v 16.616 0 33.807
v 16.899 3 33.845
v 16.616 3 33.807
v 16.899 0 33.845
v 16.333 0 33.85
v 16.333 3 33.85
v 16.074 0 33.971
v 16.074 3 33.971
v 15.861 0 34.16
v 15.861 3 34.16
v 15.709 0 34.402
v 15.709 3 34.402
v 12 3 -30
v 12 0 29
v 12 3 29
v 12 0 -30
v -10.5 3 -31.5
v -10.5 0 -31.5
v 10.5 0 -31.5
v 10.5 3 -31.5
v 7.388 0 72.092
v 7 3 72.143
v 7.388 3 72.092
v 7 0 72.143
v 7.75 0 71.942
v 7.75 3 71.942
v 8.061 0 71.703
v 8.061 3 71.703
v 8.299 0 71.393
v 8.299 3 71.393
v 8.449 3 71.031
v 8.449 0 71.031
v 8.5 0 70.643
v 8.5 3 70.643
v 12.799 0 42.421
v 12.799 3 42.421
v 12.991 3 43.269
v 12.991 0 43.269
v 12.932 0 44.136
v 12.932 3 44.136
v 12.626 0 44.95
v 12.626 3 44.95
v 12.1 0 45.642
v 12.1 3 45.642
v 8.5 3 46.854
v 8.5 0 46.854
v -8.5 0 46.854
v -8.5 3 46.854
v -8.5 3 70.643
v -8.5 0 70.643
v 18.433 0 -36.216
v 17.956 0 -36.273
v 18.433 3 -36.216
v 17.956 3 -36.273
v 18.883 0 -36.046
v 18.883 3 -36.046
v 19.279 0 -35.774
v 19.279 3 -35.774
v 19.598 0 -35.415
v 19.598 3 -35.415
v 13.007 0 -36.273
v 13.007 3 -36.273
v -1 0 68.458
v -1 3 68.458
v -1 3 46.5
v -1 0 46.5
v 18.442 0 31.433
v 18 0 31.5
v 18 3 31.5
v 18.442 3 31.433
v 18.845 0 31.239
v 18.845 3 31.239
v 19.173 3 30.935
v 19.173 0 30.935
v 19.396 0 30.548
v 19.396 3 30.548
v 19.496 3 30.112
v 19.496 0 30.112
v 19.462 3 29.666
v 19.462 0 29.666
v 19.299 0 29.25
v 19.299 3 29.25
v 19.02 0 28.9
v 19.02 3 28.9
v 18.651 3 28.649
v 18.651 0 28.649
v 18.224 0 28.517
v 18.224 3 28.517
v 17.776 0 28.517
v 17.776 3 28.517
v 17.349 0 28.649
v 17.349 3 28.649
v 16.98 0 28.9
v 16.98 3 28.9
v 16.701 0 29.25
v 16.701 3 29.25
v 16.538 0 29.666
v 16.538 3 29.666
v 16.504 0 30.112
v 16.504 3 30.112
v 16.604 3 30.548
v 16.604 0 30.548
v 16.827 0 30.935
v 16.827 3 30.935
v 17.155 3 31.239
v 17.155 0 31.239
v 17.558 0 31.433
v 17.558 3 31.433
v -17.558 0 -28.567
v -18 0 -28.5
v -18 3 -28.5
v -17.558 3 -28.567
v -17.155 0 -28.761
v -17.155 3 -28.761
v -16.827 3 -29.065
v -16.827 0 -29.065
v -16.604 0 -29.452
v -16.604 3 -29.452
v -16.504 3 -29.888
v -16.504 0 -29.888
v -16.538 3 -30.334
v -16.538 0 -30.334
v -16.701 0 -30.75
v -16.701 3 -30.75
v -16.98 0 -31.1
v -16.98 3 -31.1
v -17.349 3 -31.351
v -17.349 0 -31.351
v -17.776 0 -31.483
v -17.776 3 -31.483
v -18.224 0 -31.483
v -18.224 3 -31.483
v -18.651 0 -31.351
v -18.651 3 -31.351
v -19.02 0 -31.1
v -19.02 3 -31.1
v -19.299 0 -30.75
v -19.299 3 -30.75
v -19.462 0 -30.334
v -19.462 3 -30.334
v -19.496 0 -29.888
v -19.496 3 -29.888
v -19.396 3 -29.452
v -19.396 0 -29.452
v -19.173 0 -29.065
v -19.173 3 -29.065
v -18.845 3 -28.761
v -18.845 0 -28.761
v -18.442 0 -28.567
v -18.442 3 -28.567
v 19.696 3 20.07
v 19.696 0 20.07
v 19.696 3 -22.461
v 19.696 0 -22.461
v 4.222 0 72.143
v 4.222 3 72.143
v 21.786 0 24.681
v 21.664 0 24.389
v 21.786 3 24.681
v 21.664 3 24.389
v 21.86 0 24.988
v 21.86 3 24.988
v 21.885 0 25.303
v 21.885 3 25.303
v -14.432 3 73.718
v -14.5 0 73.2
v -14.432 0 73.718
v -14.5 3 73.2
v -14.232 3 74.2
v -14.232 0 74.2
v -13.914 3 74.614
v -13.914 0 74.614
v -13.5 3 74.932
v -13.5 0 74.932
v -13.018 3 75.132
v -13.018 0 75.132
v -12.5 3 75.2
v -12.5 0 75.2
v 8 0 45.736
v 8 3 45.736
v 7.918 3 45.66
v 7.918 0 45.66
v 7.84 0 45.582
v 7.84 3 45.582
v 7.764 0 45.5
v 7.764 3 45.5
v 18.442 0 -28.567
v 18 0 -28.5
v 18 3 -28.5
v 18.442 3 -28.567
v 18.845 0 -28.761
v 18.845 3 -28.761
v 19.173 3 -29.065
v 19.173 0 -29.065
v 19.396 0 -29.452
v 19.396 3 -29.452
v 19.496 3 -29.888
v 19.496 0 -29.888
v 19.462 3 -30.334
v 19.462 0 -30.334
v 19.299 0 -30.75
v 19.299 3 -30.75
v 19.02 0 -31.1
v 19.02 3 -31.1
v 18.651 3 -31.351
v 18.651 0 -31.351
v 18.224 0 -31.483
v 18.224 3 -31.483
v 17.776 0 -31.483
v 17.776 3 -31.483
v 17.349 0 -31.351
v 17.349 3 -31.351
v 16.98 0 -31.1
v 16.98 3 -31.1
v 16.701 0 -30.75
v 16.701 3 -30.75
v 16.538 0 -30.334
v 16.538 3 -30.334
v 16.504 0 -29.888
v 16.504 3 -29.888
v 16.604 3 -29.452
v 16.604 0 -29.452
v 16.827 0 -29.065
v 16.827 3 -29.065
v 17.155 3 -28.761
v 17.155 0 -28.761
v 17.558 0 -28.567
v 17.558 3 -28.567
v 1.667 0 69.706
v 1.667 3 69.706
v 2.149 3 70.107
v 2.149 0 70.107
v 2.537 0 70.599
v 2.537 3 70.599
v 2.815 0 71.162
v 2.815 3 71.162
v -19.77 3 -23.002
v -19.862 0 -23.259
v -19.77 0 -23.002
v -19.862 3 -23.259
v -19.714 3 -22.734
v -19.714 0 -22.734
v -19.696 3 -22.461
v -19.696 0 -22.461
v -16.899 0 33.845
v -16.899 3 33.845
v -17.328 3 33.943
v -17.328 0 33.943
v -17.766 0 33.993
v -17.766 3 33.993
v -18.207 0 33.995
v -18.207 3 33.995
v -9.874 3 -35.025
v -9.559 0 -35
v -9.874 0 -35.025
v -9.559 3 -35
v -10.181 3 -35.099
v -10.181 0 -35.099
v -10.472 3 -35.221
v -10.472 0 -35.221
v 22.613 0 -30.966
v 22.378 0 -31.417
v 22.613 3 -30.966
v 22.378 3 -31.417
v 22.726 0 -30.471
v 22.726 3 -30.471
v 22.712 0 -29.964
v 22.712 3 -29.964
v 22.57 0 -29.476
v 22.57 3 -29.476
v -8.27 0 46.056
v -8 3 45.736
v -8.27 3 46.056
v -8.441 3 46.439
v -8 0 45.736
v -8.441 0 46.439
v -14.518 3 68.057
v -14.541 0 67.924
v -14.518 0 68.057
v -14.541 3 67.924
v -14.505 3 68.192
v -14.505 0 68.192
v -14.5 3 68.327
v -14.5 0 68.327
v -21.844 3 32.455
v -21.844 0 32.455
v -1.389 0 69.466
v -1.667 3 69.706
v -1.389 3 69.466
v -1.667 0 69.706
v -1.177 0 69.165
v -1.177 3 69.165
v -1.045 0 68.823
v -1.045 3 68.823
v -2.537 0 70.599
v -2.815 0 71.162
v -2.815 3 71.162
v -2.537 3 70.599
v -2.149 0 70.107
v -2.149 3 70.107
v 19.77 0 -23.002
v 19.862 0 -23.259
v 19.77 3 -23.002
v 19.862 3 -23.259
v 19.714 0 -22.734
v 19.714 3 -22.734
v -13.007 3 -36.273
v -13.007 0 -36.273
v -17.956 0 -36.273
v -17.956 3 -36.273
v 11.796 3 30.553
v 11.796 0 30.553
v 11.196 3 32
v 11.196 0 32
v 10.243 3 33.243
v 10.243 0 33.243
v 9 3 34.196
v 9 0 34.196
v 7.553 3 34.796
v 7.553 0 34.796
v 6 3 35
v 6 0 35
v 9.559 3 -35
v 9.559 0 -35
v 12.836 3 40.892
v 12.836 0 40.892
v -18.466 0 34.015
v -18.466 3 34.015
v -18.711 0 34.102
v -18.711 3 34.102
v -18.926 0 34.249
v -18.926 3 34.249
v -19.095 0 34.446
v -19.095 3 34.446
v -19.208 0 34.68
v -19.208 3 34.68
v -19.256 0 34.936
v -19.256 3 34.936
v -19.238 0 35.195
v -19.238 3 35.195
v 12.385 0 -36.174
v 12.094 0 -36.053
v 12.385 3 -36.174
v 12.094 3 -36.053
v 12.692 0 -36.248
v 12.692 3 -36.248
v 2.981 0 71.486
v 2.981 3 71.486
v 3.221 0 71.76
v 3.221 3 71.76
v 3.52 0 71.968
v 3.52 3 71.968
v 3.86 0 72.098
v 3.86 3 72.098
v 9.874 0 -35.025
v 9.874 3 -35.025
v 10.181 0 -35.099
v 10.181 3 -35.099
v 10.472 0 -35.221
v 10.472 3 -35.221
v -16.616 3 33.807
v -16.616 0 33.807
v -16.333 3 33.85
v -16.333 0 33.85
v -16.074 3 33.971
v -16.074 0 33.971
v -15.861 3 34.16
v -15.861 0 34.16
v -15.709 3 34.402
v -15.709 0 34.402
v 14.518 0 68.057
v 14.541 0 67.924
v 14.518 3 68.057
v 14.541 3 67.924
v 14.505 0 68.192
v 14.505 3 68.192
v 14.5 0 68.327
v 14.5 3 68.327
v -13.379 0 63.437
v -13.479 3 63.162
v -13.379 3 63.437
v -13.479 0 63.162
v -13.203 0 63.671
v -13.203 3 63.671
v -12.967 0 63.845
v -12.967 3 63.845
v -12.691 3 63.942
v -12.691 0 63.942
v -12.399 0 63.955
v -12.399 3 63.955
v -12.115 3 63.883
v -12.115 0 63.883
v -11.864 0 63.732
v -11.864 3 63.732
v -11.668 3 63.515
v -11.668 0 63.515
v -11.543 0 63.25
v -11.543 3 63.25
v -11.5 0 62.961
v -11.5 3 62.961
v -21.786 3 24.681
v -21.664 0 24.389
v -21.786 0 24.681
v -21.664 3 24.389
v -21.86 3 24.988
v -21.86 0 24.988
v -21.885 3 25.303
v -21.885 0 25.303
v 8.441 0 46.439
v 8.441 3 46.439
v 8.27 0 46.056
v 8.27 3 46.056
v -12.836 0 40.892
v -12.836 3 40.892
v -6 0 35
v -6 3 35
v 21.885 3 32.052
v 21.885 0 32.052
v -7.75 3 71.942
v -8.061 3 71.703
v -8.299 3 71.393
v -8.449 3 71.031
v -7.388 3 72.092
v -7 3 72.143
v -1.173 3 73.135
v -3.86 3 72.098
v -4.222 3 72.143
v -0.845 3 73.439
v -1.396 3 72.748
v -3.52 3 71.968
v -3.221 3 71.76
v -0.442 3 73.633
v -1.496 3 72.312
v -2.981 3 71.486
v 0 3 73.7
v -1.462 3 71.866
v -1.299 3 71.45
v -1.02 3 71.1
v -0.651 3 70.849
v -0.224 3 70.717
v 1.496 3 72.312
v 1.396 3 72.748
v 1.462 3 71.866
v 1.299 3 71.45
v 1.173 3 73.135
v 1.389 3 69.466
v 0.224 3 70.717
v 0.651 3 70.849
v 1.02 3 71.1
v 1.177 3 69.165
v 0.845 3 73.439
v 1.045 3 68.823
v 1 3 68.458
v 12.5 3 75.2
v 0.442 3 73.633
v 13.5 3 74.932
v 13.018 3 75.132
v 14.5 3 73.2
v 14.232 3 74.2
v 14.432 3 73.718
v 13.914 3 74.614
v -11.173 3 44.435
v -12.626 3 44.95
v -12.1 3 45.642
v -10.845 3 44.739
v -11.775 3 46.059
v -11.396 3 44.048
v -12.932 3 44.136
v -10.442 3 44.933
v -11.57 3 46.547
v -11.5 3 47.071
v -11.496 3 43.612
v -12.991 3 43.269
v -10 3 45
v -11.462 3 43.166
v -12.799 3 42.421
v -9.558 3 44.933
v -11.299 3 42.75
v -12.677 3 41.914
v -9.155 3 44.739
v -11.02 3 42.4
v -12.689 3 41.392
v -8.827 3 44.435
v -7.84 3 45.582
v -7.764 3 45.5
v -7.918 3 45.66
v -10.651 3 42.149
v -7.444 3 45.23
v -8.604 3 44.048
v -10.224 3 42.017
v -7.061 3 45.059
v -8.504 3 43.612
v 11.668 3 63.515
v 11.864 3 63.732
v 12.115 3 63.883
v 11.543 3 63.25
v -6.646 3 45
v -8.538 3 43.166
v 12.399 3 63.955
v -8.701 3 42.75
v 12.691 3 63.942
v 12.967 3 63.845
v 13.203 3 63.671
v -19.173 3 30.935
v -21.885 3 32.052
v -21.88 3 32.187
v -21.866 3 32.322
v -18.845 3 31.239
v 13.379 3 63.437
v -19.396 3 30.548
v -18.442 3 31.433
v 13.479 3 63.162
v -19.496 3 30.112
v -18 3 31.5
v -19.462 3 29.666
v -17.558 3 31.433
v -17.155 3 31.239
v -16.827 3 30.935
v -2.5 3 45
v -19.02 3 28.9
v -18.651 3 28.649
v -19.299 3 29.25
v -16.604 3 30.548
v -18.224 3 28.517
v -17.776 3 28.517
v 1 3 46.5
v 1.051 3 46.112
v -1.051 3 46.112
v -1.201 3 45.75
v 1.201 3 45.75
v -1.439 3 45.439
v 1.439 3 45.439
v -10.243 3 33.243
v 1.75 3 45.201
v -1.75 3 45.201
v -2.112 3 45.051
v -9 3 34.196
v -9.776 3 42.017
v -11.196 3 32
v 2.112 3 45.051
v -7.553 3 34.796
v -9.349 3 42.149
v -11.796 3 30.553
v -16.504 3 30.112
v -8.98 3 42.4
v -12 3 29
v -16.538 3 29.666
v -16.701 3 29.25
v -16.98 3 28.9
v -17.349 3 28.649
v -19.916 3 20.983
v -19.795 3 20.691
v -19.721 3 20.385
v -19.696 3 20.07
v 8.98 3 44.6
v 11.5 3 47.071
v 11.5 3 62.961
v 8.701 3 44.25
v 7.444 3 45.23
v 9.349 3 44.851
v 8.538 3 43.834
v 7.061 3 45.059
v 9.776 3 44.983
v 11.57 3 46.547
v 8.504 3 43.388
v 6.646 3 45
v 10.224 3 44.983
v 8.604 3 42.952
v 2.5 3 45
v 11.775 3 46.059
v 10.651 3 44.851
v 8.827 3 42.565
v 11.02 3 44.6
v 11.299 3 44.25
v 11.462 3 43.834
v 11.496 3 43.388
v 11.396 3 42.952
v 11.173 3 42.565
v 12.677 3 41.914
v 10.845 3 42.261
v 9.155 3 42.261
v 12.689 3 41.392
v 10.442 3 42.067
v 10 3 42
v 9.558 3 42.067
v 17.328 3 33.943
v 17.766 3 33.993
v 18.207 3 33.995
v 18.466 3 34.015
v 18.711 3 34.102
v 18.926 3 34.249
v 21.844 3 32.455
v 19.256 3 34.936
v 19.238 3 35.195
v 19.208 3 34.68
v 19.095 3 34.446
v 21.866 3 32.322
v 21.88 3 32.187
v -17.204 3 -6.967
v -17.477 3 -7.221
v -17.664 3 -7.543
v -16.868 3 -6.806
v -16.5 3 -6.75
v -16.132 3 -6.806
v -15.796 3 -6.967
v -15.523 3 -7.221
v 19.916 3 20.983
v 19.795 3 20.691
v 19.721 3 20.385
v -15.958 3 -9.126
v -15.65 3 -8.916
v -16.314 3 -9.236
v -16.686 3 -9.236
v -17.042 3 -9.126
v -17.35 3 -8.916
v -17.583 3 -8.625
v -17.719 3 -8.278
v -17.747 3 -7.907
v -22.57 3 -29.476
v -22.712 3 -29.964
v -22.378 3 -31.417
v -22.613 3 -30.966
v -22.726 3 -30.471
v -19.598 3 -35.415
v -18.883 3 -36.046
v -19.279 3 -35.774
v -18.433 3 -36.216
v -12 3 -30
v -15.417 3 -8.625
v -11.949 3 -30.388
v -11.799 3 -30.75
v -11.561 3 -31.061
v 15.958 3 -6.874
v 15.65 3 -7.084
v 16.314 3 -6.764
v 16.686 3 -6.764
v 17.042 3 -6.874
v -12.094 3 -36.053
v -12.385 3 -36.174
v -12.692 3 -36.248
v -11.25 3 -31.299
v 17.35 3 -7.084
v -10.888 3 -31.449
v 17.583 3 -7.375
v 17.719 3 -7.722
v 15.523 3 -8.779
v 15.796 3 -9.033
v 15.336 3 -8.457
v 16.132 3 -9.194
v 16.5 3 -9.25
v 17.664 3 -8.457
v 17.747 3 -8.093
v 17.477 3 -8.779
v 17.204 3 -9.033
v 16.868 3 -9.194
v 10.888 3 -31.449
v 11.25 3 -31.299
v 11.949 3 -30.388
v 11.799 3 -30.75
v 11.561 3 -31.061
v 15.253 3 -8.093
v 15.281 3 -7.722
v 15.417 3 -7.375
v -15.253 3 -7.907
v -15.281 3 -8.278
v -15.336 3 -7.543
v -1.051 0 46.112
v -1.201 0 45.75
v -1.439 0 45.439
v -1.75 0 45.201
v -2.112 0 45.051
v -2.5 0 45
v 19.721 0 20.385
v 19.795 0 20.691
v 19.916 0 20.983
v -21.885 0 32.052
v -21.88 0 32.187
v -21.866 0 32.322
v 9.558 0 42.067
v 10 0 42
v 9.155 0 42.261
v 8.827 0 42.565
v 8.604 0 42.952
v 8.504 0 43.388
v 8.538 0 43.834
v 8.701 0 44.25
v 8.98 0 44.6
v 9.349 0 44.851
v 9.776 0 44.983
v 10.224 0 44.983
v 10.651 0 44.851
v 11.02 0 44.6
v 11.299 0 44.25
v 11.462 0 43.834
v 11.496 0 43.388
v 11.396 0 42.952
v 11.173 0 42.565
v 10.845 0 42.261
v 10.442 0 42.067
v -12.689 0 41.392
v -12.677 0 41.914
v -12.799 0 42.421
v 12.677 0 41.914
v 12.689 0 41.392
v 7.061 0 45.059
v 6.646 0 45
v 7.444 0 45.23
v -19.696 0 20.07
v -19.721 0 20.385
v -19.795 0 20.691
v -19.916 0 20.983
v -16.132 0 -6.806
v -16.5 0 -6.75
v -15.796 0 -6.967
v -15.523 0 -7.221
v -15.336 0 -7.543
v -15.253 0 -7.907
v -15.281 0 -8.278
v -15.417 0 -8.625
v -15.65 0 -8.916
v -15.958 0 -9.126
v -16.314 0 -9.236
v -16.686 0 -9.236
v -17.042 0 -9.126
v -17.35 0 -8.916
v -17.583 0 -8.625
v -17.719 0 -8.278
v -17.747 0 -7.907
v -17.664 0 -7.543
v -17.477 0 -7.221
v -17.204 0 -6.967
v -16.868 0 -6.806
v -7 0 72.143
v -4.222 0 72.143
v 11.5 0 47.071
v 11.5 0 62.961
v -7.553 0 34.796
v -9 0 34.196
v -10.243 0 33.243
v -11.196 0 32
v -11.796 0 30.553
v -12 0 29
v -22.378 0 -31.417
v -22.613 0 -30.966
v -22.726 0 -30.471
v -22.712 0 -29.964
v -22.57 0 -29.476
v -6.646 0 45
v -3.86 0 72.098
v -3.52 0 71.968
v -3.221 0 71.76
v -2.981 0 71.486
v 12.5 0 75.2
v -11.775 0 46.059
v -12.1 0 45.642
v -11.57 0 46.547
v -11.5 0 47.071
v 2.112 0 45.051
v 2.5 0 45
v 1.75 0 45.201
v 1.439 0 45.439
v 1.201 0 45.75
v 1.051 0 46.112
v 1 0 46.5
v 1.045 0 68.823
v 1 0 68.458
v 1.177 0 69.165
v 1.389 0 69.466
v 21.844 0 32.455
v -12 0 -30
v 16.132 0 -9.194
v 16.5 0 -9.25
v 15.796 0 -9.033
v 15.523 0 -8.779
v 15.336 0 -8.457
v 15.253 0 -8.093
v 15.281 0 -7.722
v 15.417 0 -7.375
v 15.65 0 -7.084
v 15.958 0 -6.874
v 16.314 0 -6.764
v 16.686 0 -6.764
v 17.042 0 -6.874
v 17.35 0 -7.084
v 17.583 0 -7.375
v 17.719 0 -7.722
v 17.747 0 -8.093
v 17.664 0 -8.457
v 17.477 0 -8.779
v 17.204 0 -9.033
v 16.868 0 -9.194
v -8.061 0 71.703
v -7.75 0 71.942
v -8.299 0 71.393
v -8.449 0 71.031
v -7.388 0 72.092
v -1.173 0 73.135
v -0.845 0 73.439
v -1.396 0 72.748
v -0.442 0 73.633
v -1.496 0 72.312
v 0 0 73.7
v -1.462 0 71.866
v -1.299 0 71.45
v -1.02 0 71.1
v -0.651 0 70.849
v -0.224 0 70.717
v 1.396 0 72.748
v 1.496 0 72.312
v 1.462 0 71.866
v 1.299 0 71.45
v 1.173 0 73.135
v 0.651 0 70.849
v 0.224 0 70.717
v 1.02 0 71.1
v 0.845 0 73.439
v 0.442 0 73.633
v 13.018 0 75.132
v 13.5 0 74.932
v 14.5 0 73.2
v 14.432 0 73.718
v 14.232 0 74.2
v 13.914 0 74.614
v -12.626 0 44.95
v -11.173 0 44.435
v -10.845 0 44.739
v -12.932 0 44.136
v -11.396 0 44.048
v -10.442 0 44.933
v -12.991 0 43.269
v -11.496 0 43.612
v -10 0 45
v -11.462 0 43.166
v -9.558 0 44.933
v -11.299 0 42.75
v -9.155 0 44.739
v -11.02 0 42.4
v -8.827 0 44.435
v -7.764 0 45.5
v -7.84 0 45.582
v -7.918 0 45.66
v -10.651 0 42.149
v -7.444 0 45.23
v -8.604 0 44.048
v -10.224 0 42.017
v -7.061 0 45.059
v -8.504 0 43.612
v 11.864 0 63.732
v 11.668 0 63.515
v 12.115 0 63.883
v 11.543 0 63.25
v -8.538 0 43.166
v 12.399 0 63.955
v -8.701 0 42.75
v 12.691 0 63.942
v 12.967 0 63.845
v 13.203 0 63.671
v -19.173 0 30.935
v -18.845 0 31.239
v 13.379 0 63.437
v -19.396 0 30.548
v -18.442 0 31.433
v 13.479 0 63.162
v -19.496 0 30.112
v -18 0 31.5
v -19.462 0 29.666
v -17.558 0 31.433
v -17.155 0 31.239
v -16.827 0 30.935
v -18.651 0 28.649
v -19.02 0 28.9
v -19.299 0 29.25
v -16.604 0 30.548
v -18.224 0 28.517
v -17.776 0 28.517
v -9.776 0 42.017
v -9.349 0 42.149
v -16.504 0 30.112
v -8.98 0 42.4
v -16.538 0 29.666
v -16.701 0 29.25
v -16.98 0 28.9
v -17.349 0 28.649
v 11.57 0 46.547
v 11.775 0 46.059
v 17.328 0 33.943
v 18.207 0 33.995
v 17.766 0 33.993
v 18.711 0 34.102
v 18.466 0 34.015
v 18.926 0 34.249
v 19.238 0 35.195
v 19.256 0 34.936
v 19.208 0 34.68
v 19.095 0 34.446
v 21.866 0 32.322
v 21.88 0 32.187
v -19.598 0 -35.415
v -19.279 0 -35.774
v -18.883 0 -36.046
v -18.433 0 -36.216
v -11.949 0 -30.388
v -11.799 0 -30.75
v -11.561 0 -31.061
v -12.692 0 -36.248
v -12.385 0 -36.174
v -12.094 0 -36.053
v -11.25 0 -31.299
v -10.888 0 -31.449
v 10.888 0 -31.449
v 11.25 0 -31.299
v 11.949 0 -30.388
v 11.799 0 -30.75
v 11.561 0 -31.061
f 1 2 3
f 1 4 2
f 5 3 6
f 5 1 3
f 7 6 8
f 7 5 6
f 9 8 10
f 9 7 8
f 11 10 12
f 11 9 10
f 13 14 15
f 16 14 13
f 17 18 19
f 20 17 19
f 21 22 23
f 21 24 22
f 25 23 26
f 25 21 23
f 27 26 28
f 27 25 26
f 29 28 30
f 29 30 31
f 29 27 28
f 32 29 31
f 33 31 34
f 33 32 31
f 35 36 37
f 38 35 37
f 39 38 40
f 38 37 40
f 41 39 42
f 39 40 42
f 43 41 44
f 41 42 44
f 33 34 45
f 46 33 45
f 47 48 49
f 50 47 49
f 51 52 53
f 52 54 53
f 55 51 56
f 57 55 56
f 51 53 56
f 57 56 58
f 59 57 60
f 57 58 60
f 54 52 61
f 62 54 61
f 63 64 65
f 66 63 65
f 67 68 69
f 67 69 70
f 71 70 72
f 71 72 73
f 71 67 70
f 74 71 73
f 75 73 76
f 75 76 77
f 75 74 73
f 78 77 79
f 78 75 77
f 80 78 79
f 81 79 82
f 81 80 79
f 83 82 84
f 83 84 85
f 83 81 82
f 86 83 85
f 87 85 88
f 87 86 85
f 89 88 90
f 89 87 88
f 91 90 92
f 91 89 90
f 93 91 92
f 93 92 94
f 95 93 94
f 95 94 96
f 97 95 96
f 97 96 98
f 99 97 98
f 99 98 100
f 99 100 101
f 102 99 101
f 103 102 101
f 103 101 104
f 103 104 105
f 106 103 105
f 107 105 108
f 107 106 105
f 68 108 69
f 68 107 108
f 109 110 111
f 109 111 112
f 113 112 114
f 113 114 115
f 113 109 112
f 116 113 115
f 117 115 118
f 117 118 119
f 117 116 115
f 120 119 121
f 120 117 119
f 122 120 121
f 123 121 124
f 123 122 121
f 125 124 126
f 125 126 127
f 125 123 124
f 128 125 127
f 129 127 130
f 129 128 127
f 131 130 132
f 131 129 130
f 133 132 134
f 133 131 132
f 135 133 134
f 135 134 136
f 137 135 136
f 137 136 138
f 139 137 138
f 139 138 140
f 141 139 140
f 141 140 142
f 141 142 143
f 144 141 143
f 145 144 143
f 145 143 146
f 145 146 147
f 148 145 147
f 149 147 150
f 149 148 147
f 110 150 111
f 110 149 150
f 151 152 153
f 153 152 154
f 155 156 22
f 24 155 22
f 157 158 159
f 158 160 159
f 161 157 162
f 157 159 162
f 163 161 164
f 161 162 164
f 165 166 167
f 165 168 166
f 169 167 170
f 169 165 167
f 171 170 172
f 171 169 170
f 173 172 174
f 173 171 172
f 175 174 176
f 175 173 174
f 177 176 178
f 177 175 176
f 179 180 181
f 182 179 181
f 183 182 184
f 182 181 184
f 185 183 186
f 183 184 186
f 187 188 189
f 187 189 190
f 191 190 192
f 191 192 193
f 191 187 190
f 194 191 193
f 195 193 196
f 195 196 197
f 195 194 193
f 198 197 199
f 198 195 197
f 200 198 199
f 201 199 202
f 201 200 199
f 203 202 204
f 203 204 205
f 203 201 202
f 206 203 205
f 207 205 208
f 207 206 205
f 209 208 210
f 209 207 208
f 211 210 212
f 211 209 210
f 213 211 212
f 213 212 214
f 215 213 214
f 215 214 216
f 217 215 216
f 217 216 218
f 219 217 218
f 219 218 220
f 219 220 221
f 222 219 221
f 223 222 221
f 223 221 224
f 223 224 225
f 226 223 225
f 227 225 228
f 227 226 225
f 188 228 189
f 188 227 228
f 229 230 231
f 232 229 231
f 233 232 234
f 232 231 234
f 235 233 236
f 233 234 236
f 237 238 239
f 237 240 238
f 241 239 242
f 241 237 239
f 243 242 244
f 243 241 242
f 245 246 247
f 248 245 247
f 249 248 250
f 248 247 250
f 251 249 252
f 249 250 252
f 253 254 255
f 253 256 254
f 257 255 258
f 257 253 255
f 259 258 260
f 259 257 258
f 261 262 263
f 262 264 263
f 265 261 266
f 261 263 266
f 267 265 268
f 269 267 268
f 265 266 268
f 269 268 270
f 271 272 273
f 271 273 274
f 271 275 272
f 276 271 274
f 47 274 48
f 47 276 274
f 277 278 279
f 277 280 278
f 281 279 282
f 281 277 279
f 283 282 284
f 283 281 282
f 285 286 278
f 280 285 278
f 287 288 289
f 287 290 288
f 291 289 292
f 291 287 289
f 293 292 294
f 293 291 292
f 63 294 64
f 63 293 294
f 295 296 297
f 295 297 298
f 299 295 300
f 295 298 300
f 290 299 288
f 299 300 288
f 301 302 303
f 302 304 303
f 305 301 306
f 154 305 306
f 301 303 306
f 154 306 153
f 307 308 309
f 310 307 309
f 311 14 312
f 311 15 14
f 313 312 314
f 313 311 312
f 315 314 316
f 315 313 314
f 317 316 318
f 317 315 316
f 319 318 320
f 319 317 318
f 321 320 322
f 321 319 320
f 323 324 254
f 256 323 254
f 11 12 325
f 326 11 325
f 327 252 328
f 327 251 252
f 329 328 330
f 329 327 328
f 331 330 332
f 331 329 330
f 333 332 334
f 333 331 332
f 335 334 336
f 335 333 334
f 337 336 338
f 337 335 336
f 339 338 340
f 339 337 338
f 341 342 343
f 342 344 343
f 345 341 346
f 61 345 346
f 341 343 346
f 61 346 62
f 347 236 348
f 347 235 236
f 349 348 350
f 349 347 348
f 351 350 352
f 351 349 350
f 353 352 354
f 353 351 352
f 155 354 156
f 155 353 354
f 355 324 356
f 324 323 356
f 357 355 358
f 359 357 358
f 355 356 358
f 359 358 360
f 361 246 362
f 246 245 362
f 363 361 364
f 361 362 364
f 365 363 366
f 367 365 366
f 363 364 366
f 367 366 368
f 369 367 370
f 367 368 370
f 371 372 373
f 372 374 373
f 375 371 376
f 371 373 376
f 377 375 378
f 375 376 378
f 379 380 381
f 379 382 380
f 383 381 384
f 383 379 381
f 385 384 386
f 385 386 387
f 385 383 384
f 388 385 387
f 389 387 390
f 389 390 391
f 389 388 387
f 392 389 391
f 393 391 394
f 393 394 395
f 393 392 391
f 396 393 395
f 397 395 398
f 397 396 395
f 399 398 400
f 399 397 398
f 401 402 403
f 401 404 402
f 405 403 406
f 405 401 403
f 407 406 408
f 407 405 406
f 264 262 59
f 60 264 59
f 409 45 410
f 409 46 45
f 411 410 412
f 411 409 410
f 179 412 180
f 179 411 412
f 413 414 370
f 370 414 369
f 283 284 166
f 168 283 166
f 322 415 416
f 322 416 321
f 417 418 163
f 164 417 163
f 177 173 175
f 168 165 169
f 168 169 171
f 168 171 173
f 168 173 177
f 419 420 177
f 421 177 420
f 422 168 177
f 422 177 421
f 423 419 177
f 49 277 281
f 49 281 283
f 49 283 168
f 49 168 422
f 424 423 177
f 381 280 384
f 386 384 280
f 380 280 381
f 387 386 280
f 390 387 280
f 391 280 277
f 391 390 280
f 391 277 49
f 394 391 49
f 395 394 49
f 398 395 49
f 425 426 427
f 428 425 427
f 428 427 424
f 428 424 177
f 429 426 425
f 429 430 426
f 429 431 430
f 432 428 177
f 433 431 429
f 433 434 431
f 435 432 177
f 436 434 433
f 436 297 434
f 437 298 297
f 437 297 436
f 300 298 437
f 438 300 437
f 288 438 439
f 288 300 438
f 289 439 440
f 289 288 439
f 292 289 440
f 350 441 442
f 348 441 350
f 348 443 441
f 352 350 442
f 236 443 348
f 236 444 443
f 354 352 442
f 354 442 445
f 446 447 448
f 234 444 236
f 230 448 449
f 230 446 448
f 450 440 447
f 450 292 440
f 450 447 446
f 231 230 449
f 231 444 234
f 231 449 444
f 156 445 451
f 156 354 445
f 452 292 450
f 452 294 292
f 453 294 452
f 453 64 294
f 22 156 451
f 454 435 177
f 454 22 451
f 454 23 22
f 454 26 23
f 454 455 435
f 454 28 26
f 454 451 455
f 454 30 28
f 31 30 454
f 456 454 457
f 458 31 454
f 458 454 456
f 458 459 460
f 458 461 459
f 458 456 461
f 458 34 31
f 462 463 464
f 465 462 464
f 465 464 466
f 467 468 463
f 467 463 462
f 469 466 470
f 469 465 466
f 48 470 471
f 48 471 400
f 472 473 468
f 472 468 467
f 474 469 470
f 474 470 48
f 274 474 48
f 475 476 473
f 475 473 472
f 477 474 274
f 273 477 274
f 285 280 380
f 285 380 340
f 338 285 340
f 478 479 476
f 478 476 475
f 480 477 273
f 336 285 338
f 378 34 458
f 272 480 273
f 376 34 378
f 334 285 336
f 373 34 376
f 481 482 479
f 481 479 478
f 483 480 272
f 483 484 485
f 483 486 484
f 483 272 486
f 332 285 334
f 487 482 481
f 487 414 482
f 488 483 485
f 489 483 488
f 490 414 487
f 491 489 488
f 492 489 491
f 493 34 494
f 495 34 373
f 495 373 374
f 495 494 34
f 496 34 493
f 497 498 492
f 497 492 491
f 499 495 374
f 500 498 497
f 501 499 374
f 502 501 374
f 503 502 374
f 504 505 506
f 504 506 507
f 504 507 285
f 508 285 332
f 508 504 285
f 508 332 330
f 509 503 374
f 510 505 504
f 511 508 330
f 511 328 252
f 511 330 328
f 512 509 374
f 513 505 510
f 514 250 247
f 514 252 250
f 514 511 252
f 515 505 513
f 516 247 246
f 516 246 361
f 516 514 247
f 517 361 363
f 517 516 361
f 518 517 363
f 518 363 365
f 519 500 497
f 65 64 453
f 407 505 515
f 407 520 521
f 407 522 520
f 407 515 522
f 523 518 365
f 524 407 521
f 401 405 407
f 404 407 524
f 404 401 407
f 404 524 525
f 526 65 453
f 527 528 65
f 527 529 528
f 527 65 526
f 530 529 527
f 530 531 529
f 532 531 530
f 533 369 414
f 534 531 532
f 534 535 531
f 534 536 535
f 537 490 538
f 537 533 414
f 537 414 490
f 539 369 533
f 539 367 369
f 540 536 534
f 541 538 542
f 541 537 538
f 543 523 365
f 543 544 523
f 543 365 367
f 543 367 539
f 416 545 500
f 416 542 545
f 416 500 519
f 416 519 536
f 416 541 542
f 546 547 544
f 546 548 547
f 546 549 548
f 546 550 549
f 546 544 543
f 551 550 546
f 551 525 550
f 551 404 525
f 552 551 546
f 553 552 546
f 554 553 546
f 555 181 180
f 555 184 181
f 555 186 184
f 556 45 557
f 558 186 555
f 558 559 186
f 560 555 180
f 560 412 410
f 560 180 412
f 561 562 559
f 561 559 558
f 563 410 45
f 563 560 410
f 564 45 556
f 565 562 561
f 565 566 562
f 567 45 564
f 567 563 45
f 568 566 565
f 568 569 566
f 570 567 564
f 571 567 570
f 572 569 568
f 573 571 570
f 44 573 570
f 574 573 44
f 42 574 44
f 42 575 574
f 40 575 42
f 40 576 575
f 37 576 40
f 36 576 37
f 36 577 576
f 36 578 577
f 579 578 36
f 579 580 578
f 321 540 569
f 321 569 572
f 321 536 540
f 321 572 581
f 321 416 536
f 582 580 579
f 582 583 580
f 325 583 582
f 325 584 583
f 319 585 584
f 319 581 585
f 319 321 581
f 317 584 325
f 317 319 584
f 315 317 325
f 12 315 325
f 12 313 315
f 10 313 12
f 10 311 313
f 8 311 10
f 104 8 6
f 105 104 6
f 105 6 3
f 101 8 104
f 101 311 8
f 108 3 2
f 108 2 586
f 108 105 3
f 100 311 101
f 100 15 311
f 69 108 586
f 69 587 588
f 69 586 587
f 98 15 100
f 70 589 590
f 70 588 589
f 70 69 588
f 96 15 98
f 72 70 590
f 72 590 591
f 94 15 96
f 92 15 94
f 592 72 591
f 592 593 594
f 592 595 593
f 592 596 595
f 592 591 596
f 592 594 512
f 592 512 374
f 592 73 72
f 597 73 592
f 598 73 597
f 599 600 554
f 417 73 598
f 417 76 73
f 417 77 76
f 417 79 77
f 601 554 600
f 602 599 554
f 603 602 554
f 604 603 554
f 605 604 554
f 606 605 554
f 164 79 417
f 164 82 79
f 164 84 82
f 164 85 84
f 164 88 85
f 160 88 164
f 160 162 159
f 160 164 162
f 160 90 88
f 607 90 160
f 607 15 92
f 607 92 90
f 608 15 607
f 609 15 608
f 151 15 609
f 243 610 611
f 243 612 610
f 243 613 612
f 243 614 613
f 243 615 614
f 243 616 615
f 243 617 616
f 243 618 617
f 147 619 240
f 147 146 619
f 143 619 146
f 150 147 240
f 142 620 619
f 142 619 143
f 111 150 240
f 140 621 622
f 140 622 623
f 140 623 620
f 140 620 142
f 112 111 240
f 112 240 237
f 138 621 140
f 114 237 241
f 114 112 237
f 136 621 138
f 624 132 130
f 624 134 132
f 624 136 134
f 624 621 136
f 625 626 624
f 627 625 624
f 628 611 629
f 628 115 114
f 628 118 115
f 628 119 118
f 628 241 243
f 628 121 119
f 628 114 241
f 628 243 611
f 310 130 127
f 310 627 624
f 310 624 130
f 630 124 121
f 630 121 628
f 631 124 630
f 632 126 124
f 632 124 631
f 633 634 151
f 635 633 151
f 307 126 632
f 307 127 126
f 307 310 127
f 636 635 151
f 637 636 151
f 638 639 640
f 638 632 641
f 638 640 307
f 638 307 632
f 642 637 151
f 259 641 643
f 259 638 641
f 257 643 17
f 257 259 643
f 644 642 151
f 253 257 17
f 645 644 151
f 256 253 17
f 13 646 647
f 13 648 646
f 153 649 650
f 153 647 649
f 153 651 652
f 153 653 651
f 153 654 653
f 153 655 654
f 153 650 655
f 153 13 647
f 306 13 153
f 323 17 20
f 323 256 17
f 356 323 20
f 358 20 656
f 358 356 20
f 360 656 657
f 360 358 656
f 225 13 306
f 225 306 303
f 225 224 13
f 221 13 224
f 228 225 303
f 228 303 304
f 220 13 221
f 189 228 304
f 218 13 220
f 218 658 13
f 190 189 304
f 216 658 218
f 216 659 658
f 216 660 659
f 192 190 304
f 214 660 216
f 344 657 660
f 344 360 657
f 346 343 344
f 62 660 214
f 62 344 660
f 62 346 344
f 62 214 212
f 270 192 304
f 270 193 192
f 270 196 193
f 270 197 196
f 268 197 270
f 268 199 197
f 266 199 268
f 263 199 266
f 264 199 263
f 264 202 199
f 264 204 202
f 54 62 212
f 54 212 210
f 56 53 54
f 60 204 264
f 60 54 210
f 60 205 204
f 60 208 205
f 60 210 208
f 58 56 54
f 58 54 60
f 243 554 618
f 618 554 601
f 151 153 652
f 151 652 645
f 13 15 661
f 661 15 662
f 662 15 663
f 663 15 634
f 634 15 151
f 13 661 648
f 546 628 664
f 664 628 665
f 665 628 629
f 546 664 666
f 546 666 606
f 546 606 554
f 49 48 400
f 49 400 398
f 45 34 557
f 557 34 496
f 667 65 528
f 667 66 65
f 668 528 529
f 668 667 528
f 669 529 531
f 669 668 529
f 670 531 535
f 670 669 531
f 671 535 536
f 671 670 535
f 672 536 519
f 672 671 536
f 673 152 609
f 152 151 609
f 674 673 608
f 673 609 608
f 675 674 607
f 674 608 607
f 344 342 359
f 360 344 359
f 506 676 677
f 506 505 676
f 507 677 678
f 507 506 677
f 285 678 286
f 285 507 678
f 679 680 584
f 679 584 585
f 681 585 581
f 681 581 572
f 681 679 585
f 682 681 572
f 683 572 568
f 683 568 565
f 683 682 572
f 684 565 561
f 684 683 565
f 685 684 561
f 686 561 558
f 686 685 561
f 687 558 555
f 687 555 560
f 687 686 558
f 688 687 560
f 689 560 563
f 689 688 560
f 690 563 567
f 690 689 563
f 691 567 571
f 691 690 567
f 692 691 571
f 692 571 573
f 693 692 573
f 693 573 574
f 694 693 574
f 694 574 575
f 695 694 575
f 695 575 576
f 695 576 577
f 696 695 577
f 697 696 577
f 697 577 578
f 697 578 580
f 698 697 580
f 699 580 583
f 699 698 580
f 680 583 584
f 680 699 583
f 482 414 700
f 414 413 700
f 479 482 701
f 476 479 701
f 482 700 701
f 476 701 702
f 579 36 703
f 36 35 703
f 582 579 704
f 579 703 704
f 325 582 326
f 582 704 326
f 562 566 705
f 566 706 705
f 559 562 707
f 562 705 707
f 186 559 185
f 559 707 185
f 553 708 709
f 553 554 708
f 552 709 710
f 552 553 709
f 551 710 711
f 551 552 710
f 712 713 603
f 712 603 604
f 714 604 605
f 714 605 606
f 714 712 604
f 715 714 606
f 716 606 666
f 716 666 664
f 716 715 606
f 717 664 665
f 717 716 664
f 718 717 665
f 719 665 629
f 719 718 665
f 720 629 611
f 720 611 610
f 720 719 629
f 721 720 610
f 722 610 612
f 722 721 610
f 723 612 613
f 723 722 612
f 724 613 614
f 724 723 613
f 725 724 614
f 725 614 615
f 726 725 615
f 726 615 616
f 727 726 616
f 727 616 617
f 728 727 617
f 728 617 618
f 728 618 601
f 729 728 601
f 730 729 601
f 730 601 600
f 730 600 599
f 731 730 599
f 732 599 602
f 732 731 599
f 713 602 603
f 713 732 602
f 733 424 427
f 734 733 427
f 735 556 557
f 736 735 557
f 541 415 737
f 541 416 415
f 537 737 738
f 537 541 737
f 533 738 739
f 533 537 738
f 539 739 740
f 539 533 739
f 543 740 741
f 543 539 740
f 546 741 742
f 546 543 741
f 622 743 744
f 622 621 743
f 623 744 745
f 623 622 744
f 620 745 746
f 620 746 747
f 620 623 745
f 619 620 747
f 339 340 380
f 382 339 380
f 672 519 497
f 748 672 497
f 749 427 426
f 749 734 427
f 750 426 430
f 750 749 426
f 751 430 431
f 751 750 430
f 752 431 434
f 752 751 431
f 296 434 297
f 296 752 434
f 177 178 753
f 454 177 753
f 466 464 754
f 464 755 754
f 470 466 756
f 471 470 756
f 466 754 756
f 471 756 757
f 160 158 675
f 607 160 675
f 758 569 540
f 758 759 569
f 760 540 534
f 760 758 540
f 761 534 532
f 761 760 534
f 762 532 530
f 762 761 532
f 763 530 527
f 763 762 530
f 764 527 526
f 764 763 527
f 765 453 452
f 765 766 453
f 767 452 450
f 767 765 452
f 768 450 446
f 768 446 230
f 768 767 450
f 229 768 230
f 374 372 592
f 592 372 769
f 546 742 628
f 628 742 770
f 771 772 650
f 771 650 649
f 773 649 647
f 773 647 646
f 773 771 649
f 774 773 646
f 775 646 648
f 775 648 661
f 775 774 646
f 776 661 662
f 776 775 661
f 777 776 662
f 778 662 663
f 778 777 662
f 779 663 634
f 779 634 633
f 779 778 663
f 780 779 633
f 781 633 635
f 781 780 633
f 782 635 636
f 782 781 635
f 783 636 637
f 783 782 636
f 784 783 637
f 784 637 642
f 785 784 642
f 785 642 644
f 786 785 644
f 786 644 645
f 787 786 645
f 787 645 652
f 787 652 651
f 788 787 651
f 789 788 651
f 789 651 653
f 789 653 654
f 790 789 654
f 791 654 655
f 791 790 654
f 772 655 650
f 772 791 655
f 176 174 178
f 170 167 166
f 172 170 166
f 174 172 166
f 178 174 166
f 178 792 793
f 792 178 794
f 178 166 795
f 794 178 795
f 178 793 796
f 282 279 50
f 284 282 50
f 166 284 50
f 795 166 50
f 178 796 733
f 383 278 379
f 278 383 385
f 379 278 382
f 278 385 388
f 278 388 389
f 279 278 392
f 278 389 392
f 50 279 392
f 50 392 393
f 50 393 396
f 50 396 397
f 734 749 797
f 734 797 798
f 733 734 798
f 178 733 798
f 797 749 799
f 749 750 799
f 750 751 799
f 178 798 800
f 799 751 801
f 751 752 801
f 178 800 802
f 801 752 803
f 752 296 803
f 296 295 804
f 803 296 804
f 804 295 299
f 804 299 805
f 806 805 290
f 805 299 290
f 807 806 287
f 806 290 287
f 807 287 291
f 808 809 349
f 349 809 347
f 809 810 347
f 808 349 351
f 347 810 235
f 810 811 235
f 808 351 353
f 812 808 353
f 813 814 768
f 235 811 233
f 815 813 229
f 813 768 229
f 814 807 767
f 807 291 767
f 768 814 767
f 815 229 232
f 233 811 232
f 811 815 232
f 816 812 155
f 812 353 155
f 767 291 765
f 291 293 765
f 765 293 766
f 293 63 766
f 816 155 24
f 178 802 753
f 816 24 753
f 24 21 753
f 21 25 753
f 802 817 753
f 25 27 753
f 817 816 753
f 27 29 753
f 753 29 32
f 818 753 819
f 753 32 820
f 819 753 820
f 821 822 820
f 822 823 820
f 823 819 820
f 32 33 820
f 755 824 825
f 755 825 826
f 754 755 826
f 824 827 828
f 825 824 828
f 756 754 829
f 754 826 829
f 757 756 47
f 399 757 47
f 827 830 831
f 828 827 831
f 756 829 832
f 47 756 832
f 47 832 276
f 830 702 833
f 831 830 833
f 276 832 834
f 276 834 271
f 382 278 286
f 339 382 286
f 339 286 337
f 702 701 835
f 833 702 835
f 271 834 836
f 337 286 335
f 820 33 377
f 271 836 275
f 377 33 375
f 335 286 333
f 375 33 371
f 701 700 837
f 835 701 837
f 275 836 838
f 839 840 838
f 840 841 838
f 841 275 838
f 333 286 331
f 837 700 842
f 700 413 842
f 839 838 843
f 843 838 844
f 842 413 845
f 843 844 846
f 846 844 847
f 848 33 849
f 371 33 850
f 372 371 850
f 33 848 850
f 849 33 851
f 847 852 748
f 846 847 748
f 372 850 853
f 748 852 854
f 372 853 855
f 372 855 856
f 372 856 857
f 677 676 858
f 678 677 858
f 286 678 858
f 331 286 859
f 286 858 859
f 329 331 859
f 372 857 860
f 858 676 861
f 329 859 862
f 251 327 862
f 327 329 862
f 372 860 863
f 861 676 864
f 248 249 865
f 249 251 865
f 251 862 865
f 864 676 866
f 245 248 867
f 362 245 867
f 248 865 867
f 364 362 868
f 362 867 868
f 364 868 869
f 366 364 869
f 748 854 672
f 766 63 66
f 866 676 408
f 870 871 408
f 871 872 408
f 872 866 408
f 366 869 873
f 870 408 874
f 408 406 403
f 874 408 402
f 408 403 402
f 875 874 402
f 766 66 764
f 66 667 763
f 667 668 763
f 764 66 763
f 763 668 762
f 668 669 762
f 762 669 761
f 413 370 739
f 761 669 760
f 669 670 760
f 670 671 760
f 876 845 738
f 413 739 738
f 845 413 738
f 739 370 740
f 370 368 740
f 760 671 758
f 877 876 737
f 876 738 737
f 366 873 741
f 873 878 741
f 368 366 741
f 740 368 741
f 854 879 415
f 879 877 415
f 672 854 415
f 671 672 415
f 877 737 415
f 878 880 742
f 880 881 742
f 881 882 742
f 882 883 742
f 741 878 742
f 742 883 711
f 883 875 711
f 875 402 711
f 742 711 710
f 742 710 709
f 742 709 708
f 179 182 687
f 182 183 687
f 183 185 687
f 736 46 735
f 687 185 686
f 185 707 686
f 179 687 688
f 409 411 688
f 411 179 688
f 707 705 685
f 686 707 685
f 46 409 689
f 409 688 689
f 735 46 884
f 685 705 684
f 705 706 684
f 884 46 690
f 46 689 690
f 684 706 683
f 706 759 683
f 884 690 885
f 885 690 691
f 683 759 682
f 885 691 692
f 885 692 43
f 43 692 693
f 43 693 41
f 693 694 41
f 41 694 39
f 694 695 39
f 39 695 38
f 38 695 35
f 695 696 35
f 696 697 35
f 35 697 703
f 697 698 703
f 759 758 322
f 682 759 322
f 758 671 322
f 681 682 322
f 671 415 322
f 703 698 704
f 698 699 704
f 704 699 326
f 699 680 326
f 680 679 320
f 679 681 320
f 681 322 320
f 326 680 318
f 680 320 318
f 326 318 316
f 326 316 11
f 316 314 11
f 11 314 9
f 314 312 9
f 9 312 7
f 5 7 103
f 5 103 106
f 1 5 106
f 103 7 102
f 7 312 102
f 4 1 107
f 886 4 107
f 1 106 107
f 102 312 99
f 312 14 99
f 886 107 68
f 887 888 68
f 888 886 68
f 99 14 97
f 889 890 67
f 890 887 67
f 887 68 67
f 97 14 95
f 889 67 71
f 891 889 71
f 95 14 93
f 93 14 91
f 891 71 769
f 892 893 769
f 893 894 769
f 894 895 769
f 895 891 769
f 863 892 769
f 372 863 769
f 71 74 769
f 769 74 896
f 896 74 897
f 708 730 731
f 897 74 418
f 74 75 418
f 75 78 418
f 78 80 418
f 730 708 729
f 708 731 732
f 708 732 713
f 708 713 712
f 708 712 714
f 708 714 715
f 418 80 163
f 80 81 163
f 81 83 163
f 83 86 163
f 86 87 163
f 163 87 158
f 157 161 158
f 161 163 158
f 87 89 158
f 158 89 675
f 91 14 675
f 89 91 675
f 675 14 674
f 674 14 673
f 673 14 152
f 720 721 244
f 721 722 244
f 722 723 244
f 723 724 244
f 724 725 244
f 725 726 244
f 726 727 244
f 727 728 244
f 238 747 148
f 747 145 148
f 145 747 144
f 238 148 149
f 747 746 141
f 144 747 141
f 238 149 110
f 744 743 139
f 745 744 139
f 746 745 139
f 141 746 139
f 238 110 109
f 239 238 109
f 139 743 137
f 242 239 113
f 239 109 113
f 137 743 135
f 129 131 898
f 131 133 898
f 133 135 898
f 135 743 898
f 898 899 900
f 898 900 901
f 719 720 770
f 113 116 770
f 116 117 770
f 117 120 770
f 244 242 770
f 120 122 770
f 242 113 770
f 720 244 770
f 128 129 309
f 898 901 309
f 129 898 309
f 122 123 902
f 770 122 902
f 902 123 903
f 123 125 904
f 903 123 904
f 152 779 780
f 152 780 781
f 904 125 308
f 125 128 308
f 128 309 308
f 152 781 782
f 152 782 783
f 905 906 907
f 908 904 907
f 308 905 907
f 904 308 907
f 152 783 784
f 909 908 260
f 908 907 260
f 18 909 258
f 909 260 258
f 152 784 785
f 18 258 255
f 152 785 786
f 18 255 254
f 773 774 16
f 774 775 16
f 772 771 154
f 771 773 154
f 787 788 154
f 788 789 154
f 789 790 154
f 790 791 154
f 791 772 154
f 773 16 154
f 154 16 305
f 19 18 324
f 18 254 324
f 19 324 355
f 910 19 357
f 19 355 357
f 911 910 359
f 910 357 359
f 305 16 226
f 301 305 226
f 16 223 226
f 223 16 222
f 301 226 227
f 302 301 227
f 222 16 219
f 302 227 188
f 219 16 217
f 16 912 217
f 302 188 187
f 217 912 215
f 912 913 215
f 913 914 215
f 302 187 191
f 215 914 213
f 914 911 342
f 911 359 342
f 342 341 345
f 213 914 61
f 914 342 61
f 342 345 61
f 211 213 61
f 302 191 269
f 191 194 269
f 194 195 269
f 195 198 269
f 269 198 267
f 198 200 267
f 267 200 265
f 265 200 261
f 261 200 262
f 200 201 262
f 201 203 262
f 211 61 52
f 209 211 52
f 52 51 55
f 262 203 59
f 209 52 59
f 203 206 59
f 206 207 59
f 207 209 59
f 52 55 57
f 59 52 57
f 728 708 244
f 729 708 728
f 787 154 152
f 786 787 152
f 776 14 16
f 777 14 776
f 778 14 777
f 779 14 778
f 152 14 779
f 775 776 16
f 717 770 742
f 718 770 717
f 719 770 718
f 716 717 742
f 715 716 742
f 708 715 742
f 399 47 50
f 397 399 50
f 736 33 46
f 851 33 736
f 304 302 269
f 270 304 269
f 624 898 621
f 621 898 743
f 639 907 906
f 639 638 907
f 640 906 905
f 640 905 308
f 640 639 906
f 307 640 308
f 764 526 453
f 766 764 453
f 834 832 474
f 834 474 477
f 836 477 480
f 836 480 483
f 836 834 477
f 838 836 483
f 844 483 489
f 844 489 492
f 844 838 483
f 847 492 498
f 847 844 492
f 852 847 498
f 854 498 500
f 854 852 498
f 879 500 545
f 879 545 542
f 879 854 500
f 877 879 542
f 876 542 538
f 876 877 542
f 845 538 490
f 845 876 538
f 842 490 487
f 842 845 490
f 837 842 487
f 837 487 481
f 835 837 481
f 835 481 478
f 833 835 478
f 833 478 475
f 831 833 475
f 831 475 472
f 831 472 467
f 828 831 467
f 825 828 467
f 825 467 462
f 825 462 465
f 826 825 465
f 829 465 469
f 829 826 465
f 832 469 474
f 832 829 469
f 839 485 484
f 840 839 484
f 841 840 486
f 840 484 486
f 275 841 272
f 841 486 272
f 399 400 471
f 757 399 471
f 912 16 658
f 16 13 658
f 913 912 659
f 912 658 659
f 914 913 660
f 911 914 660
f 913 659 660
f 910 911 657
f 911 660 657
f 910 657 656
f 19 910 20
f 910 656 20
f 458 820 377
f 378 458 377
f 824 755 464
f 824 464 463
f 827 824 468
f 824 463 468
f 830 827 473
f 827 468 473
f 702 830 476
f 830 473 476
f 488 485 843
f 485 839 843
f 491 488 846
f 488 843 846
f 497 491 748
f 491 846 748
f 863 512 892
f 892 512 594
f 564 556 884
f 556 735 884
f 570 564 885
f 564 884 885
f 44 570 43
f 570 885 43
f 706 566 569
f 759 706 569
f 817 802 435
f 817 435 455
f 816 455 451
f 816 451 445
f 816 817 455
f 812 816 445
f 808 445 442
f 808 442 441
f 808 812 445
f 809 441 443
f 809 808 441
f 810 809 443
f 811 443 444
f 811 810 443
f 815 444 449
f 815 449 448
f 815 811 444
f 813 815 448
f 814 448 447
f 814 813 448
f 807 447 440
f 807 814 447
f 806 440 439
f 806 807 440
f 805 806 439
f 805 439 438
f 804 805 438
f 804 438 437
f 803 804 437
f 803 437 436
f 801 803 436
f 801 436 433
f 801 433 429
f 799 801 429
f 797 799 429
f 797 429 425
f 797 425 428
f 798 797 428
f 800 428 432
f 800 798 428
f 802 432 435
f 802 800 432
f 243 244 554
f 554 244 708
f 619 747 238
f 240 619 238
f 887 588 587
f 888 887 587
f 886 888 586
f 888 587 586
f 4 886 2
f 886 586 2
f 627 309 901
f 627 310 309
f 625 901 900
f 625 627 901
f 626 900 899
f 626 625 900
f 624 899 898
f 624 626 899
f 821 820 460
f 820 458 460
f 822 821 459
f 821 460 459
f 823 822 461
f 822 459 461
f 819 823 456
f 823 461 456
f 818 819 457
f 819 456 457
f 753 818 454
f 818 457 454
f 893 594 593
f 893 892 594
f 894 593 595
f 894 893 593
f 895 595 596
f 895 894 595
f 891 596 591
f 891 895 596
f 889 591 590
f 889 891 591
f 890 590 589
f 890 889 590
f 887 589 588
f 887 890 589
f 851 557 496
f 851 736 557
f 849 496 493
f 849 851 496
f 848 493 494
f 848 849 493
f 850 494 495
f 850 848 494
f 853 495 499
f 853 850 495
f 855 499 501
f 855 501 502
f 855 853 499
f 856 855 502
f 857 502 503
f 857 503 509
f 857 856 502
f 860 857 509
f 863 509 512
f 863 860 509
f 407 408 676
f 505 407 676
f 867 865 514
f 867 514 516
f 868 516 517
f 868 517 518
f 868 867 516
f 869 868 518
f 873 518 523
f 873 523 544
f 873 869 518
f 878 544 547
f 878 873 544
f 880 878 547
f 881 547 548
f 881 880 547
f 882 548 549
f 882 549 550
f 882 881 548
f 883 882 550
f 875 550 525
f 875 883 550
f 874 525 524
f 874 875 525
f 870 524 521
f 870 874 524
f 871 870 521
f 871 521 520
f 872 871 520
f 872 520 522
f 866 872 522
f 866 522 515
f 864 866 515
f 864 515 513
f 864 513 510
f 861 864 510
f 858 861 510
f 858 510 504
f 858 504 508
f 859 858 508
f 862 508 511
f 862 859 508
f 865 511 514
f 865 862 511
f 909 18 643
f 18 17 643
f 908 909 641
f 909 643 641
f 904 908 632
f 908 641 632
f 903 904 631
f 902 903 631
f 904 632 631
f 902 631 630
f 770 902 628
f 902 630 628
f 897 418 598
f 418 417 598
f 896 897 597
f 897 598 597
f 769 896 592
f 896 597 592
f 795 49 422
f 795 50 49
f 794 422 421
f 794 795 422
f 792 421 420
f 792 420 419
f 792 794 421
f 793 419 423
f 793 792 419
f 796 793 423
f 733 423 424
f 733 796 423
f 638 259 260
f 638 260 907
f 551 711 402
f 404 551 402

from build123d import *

# Parameters (mm, degrees)
SKETCH_1_R          = 1.5
SKETCH_1_R_2        = 1.25
SKETCH_1_W          = 24
SKETCH_1_H          = 66.5
EXTRUDE_1_DEPTH     = 3
FILLET_1_R          = 1.5
CUT_EXTRUDE_1_DEPTH = 3
FILLET_2_R          = 1
FILLET_3_R          = 1.5
FILLET_4_R          = 2
FILLET_5_R          = 2
FILLET_6_R          = 6


with BuildPart() as part:
    # 草图1 → 凸台-拉伸1 (new body)
    with BuildSketch(Plane(origin=(0, 0, 0), x_dir=(1, 0, 0), z_dir=(0, 1, 0))):
        Polygon((10.04233564, 35), (-10.04233564, 35), (-12.523742682, 36.273217412), (-19.001684764, 36.273217412), (-23.015493308, 30.5), (-19.695655938, 22.877483708), (-19.695655938, -20.552984489), (-21.884751354, -24.819370363), (-21.884751354, -32.255531362), (-14.5, -68.123136609), (-14.5, -75.2), (14.5, -75.2), (14.5, -68.123136609), (21.884751354, -32.255531362), (21.884751354, -24.819370363), (19.695655938, -20.552984489), (19.695655938, 22.877483708), (23.015493308, 30.5), (19.001684764, 36.273217412), (12.523742682, 36.273217412), align=None)
        with Locations(Location((-18, 30, 0), (0, 0, 270))):
            Circle(SKETCH_1_R, mode=Mode.SUBTRACT)
        with Locations(Location((18, 30, 0), (0, 0, 270))):
            Circle(SKETCH_1_R, mode=Mode.SUBTRACT)
        with Locations(Location((18, -30, 0), (0, 0, 270))):
            Circle(SKETCH_1_R, mode=Mode.SUBTRACT)
        with Locations(Location((-18, -30, 0), (0, 0, 270))):
            Circle(SKETCH_1_R, mode=Mode.SUBTRACT)
        with Locations(Location((0, -72.2, 0), (0, 0, 270))):
            Circle(SKETCH_1_R, mode=Mode.SUBTRACT)
        with Locations(Location((-10, -43.5, 0), (0, 0, 270))):
            Circle(SKETCH_1_R, mode=Mode.SUBTRACT)
        with Locations(Location((10, -43.5, 0), (0, 0, 90))):
            Circle(SKETCH_1_R, mode=Mode.SUBTRACT)
        with Locations(Location((-16.5, 8, 0), (0, 0, 270))):
            Circle(SKETCH_1_R_2, mode=Mode.SUBTRACT)
        with Locations(Location((16.5, 8, 0), (0, 0, 90))):
            Circle(SKETCH_1_R_2, mode=Mode.SUBTRACT)
        with Locations((0, -1.75)):
            Rectangle(SKETCH_1_W, SKETCH_1_H, mode=Mode.SUBTRACT)
    extrude(amount=EXTRUDE_1_DEPTH)

    # 圆角1
    fillet_1_edges = [part.edges().sort_by_distance(p)[0] for p in [
        (12, 1.5, -31.5),
        (-12, 1.5, -31.5),
    ]]
    fillet(fillet_1_edges, radius=FILLET_1_R)

    # 草图2 → 切除-拉伸1 (cut)
    with BuildSketch(Plane(origin=(0, 3, 0), x_dir=(1, 0, 0), z_dir=(0, 1, 0))):
        with BuildLine():
            ThreePointArc((-16.09935509, -33.519594994), (-17.804419777, -33.995215686), (-19.547787148, -33.688408186))
            Line((-19.547787148, -33.688408186), (-11.5, -72.77636643))
            Line((-11.5, -72.77636643), (-11.5, -46.098076211))
            ThreePointArc((-11.5, -46.098076211), (-12.930484116, -44.14207698), (-12.448919233, -41.767142652))
            Line((-12.448919233, -41.767142652), (-16.09935509, -33.519594994))
        make_face()
        with BuildLine():
            ThreePointArc((-7.401923789, -45), (-7.878679656, -45.621320344), (-8.5, -46.098076211))
            Line((-8.5, -46.098076211), (-8.5, -72.142731986))
            Line((-8.5, -72.142731986), (-2.999453346, -72.142731986))
            ThreePointArc((-2.999453346, -72.142731986), (-2.43284555, -70.444647463), (-1, -69.371572875))
            Line((-1, -69.371572875), (-1, -45))
            Line((-1, -45), (-7.401923789, -45))
        make_face()
        with BuildLine():
            Line((7.401923789, -45), (1, -45))
            Line((1, -45), (1, -69.371572875))
            ThreePointArc((1, -69.371572875), (2.43284555, -70.444647463), (2.999453346, -72.142731986))
            Line((2.999453346, -72.142731986), (8.5, -72.142731986))
            Line((8.5, -72.142731986), (8.5, -46.098076211))
            ThreePointArc((8.5, -46.098076211), (7.878679656, -45.621320344), (7.401923789, -45))
        make_face()
        with BuildLine():
            ThreePointArc((12.448919233, -41.767142652), (12.930484116, -44.14207698), (11.5, -46.098076211))
            Line((11.5, -46.098076211), (11.5, -72.77636643))
            Line((11.5, -72.77636643), (19.547787148, -33.688408186))
            ThreePointArc((19.547787148, -33.688408186), (17.804419777, -33.995215686), (16.09935509, -33.519594994))
            Line((16.09935509, -33.519594994), (12.448919233, -41.767142652))
        make_face()
    extrude(amount=-CUT_EXTRUDE_1_DEPTH, mode=Mode.SUBTRACT)

    # 圆角2
    fillet_2_edges = [part.edges().sort_by_distance(p)[0] for p in [
        (-11.5, 1.5, 72.77636643),
        (-19.547787148, 1.5, 33.688408186),
        (-16.09935509, 1.5, 33.519594994),
        (19.547787148, 1.5, 33.688408186),
        (11.5, 1.5, 72.77636643),
        (16.09935509, 1.5, 33.519594994),
    ]]
    fillet(fillet_2_edges, radius=FILLET_2_R)

    # 圆角3
    fillet_3_edges = [part.edges().sort_by_distance(p)[0] for p in [
        (8.5, 1.5, 46.098076211),
        (8.5, 1.5, 72.142731986),
        (2.999453346, 1.5, 72.142731986),
        (1, 1.5, 69.371572875),
        (1, 1.5, 45),
        (7.401923789, 1.5, 45),
        (-1, 1.5, 69.371572875),
        (-2.999453346, 1.5, 72.142731986),
        (-8.5, 1.5, 72.142731986),
        (-8.5, 1.5, 46.098076211),
        (-7.401923789, 1.5, 45),
        (-1, 1.5, 45),
    ]]
    fillet(fillet_3_edges, radius=FILLET_3_R)

    # 圆角4
    fillet_4_edges = [part.edges().sort_by_distance(p)[0] for p in [
        (-12.448919233, 1.5, 41.767142652),
        (-11.5, 1.5, 46.098076211),
        (11.5, 1.5, 46.098076211),
        (12.448919233, 1.5, 41.767142652),
    ]]
    fillet(fillet_4_edges, radius=FILLET_4_R)

    # 圆角5
    fillet_5_edges = [part.edges().sort_by_distance(p)[0] for p in [
        (-12.523742682, 1.5, -36.273217412),
        (-10.04233564, 1.5, -35),
        (10.04233564, 1.5, -35),
        (12.523742682, 1.5, -36.273217412),
        (19.001684764, 1.5, -36.273217412),
        (23.015493308, 1.5, -30.5),
        (19.695655938, 1.5, -22.877483708),
        (19.695655938, 1.5, 20.552984489),
        (21.884751354, 1.5, 24.819370363),
        (21.884751354, 1.5, 32.255531362),
        (14.5, 1.5, 68.123136609),
        (14.5, 1.5, 75.2),
        (-14.5, 1.5, 75.2),
        (-14.5, 1.5, 68.123136609),
        (-21.884751354, 1.5, 32.255531362),
        (-21.884751354, 1.5, 24.819370363),
        (-19.695655938, 1.5, 20.552984489),
        (-19.695655938, 1.5, -22.877483708),
        (-23.015493308, 1.5, -30.5),
        (-19.001684764, 1.5, -36.273217412),
    ]]
    fillet(fillet_5_edges, radius=FILLET_5_R)

    # 圆角6
    fillet_6_edges = [part.edges().sort_by_distance(p)[0] for p in [
        (12, 1.5, 35),
        (-12, 1.5, 35),
    ]]
    fillet(fillet_6_edges, radius=FILLET_6_R)


solid = part.part
